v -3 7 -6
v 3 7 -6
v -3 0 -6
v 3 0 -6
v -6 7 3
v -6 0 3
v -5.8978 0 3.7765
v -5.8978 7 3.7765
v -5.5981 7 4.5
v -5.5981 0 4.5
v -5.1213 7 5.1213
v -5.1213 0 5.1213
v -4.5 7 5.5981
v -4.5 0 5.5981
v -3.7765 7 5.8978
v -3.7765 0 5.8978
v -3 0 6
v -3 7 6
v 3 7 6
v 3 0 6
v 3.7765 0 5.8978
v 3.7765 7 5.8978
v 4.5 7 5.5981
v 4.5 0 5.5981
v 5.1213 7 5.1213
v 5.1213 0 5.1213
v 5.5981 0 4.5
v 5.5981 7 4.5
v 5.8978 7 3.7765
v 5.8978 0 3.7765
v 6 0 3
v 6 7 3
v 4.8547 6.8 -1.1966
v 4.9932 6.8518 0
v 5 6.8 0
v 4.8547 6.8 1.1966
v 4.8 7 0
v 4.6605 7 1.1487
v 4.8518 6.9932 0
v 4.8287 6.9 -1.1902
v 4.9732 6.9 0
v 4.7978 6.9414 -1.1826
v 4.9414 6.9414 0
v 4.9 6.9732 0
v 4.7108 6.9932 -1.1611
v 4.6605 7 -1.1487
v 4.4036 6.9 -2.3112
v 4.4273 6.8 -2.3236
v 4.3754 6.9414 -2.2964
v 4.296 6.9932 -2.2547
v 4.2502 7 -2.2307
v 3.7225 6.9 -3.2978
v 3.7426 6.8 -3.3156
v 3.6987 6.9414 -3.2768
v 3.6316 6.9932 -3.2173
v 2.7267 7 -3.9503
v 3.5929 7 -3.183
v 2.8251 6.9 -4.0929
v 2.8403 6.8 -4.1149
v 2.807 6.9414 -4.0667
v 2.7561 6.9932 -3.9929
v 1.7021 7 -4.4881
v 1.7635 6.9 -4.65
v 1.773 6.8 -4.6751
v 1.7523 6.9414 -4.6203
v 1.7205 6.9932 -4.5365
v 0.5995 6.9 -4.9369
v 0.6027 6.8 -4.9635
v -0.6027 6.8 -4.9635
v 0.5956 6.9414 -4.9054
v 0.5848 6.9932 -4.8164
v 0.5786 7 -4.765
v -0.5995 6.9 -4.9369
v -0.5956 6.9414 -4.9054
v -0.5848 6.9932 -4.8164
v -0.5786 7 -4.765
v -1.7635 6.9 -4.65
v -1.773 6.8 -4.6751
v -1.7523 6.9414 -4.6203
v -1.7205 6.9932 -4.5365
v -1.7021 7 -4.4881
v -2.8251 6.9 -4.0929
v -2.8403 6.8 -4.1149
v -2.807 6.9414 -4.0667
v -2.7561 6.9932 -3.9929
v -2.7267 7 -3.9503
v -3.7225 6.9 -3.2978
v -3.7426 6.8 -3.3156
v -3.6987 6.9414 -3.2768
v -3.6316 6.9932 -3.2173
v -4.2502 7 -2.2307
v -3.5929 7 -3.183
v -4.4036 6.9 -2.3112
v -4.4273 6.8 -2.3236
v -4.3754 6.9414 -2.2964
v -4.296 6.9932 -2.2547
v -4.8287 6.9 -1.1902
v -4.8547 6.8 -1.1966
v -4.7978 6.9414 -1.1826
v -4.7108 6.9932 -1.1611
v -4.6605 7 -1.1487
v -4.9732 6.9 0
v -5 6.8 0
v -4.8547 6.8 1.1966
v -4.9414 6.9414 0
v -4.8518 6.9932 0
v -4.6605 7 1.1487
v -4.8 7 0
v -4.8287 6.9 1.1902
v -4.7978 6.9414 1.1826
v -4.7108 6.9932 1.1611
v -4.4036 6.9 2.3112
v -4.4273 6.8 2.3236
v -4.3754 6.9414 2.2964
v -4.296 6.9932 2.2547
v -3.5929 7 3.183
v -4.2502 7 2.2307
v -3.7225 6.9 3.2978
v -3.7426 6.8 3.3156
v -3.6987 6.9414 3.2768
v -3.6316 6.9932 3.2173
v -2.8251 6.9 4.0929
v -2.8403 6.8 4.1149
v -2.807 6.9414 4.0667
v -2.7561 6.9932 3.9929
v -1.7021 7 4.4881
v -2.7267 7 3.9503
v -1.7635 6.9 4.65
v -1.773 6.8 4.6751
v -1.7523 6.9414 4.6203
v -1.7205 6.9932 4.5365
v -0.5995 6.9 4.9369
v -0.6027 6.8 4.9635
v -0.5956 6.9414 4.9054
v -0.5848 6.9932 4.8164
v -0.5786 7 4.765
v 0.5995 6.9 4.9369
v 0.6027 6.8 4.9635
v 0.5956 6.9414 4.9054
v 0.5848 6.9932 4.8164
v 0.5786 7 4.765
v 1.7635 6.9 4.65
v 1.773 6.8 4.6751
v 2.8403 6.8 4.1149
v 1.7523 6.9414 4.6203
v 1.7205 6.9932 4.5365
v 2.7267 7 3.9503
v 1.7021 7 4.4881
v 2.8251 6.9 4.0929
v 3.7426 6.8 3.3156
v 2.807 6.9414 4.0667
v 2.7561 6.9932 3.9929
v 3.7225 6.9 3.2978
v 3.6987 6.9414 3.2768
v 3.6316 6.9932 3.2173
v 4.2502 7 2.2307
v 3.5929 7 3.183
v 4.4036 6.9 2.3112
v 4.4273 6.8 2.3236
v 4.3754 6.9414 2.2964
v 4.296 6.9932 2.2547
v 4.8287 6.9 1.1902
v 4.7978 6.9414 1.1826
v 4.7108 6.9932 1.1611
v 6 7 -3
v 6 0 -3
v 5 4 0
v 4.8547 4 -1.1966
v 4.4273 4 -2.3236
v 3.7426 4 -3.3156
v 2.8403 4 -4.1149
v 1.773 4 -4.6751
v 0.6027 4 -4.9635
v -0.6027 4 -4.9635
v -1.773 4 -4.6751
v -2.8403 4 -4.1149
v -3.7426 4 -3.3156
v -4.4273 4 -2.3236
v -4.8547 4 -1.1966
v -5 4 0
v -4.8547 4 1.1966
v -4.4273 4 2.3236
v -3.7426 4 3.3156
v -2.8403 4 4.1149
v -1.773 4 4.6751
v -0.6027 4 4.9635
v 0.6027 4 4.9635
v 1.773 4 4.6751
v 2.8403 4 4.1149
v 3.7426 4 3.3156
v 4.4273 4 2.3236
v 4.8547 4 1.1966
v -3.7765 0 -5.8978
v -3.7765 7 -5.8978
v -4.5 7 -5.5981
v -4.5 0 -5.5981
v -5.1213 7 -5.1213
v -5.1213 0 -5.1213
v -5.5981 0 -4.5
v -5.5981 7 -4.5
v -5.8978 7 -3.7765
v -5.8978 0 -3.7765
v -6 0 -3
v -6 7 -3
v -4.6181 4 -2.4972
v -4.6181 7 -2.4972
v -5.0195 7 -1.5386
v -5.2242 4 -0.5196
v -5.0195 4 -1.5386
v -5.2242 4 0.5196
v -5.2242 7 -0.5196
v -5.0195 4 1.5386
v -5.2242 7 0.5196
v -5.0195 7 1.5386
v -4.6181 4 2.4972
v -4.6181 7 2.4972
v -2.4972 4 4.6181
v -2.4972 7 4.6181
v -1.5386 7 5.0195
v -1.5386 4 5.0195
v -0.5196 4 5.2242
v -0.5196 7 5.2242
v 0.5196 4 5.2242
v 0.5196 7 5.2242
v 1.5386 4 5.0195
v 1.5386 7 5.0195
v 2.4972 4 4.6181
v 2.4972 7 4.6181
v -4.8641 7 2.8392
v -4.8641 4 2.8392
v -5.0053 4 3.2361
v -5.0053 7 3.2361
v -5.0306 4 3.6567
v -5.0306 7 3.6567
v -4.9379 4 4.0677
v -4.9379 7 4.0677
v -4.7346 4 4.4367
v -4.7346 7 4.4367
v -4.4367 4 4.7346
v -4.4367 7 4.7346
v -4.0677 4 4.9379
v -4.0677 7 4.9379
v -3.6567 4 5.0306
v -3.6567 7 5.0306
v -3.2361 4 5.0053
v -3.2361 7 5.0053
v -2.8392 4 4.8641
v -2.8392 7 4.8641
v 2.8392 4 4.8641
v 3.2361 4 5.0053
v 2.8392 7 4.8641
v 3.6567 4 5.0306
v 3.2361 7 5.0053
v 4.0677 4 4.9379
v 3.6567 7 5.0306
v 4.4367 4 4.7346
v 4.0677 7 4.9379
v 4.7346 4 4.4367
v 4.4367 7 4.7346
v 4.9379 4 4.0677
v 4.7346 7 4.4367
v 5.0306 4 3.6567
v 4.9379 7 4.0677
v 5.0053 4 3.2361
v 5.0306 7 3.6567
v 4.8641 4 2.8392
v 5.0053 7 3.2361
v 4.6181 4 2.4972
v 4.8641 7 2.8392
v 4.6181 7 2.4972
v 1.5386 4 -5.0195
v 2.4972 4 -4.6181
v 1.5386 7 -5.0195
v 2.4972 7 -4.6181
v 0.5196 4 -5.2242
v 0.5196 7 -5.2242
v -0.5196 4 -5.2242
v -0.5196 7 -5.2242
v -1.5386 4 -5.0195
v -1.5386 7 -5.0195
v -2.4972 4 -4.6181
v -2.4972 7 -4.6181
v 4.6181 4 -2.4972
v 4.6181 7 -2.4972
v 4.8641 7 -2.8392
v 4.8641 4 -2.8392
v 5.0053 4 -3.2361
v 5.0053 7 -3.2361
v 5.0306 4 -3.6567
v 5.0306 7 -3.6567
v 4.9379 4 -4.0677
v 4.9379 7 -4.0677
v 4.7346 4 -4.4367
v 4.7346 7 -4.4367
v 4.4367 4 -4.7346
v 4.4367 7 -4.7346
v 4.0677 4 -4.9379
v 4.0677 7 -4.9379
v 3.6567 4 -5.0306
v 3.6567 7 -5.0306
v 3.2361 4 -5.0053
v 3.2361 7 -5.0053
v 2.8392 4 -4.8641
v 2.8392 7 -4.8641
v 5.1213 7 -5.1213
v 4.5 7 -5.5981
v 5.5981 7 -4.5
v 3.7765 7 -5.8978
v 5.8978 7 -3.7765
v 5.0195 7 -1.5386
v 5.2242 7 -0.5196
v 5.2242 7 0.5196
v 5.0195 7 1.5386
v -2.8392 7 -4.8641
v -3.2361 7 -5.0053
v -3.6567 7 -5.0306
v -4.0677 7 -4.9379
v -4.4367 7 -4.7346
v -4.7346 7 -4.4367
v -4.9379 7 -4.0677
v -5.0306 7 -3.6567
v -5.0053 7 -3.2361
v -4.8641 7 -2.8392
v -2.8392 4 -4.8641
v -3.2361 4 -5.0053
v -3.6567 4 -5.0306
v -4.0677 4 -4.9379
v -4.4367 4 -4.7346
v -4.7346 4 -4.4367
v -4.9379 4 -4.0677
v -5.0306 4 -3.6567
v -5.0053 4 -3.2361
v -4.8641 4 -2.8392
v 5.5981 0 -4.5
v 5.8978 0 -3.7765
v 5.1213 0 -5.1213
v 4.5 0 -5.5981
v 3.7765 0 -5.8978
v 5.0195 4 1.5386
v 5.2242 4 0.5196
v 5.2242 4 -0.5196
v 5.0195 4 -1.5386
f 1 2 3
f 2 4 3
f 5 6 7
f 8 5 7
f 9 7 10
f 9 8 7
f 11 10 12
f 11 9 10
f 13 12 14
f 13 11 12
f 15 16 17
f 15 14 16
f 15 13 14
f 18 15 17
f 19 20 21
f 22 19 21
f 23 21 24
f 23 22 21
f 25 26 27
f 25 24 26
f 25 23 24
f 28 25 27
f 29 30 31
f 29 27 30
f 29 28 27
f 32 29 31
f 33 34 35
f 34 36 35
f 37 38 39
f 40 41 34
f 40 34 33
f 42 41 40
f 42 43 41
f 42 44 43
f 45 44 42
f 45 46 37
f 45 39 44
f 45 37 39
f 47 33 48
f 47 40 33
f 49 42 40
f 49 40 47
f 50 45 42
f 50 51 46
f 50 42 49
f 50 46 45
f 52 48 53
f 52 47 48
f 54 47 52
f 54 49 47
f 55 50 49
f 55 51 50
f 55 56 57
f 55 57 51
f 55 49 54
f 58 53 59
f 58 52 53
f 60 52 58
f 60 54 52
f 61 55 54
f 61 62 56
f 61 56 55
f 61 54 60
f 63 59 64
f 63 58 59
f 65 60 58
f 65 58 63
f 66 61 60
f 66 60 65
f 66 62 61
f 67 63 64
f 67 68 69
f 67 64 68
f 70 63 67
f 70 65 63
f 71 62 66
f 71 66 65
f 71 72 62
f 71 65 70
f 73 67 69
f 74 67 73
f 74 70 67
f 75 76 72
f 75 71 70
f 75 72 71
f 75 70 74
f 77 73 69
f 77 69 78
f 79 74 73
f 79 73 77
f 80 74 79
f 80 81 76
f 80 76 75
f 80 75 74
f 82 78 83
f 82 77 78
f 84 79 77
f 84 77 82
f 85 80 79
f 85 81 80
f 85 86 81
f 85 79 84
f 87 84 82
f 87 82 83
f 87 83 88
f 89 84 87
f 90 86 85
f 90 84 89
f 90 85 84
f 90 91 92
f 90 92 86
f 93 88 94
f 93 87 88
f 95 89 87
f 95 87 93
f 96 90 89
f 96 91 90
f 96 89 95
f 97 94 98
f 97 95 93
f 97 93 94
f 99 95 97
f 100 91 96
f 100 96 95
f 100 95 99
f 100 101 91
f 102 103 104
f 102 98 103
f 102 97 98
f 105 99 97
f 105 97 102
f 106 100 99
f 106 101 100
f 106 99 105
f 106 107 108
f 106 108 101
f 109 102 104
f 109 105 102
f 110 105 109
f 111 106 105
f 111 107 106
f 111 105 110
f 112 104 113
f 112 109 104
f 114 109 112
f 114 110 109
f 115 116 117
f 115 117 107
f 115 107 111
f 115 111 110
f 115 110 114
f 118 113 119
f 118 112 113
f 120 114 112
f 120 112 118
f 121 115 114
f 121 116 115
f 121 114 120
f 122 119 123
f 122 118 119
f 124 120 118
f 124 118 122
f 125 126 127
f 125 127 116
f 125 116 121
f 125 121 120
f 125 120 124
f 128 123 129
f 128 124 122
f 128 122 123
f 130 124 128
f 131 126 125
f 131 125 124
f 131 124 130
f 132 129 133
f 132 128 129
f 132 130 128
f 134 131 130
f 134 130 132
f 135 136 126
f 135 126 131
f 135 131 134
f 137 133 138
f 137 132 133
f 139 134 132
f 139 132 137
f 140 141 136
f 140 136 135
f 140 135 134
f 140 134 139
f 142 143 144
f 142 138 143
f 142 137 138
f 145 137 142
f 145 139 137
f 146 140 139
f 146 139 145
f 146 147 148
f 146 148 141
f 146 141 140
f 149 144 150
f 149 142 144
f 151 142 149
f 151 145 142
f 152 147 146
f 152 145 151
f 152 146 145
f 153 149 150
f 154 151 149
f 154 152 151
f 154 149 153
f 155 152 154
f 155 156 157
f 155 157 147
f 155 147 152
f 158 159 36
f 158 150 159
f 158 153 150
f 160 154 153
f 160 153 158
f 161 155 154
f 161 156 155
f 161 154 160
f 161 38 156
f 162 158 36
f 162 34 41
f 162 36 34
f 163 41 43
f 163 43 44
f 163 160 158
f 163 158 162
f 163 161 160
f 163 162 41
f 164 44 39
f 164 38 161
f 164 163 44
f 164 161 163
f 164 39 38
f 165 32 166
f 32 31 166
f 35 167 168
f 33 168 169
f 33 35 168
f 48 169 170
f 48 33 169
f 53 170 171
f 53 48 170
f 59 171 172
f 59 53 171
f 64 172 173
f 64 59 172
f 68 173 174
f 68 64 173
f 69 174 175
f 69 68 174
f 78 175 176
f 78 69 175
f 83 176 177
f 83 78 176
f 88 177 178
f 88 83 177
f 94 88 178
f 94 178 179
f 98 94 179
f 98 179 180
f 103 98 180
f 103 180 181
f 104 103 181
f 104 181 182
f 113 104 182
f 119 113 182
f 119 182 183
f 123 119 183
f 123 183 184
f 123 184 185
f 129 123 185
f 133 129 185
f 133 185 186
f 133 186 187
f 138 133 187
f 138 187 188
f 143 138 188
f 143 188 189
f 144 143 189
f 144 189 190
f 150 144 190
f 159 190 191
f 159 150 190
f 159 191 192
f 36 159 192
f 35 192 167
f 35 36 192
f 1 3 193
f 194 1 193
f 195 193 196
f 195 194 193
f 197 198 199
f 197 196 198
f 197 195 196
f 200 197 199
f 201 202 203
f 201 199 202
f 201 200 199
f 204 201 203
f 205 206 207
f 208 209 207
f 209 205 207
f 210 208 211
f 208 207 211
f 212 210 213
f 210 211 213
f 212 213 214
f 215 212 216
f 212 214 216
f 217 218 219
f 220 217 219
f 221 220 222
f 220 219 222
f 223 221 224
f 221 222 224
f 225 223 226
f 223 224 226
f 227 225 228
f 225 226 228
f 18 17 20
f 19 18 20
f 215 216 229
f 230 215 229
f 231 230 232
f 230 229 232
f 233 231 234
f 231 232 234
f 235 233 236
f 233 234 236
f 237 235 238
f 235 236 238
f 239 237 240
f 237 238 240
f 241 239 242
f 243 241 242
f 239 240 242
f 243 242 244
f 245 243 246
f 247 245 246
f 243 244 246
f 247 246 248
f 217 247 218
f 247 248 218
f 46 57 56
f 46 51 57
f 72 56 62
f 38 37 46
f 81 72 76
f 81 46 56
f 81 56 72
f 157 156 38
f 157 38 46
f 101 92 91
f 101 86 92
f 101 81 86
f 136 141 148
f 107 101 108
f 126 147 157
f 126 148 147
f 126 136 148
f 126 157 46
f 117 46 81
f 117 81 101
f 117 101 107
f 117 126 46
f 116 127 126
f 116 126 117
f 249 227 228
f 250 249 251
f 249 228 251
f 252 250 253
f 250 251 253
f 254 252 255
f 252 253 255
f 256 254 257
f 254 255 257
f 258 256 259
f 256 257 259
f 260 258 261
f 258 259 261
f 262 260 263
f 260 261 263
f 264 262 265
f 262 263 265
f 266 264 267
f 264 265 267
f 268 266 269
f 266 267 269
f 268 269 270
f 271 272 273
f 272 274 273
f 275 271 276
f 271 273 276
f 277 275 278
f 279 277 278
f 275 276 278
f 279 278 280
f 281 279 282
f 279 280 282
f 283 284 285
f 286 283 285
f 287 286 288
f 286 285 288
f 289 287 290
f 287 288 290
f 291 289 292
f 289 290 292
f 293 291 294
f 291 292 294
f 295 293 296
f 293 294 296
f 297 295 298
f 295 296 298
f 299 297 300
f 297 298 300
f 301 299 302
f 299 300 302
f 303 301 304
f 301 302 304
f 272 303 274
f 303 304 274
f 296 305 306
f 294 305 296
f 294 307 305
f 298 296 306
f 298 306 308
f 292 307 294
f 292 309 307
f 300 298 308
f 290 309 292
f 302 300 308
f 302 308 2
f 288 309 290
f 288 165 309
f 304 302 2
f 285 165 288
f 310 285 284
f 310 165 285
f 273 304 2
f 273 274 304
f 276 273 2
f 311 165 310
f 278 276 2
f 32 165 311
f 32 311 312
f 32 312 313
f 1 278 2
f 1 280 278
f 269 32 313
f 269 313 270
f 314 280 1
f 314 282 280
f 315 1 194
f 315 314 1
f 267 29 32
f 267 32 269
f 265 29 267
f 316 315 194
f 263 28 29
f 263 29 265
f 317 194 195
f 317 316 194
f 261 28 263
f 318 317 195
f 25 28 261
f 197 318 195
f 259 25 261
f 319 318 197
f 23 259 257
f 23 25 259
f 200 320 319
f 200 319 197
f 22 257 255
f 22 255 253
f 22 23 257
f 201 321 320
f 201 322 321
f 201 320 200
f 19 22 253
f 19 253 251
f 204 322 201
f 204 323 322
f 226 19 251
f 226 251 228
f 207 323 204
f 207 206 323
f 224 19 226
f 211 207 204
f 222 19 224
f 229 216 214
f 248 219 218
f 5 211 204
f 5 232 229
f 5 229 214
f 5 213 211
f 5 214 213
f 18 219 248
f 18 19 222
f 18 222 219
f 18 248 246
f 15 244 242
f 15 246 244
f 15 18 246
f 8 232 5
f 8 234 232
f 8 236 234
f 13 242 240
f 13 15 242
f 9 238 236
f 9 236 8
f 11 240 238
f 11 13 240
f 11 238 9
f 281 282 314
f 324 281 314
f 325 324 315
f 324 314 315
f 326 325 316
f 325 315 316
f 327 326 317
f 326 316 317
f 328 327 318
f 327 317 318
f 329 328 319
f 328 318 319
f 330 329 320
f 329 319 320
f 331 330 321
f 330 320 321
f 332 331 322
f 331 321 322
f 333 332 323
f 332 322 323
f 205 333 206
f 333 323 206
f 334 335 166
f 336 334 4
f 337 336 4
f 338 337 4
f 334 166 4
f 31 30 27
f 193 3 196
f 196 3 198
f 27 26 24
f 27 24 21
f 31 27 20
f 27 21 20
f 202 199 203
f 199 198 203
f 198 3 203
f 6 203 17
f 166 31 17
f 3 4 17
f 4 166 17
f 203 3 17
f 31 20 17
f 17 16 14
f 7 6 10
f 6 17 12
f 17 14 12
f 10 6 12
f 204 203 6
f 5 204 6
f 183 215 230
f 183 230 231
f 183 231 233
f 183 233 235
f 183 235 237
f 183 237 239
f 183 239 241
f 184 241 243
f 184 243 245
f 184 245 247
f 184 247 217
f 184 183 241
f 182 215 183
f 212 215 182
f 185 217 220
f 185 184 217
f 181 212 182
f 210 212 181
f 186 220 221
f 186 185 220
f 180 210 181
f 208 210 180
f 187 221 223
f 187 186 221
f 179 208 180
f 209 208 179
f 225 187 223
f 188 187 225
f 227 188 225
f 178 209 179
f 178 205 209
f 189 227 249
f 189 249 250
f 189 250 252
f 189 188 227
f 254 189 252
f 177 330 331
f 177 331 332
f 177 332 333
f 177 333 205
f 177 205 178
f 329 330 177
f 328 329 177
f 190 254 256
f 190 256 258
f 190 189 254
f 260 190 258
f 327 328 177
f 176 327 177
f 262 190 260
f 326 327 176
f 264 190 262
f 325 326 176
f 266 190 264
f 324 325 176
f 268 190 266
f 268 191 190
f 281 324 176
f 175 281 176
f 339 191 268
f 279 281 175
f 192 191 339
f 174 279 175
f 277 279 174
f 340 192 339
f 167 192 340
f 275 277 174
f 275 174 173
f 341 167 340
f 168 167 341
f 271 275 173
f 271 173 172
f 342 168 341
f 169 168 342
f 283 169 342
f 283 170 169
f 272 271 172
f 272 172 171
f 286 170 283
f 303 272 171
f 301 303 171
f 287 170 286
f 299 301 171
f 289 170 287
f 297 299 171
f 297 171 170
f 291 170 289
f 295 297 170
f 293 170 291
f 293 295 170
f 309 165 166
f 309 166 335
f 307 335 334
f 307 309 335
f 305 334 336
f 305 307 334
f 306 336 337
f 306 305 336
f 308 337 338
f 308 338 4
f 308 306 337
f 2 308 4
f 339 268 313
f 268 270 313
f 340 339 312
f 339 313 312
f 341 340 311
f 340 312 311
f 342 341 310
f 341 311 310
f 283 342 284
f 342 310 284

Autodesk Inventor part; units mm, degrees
ref_plane "YZ Plane" through (0, 0, 0) normal (1, 0, 0) x (0, 1, 0)
ref_plane "XZ Plane" through (0, 0, 0) normal (0, 1, 0) x (-1, 0, 0)
ref_plane "XY Plane" through (0, 0, 0) normal (0, 0, 1) x (1, 0, 0)
sketch "スケッチ1" plane through (0, 0, 0) normal (0, 1, 0) x (-1, 0, 0)
  line L0 (-6, -6) -> (6, -6)
  line L1 (6, -6) -> (6, 6)
  line L2 (6, 6) -> (-6, 6)
  line L3 (-6, 6) -> (-6, -6)
  line L4 (-6, -6) -> (6, 6) construction
  line L5 (6, -6) -> (-6, 6) construction
  point P0 (0, 0)
  dimension "d0" = 12
extrude "押し出し1" add sketch "スケッチ1" along normal blind 7
fillet "フィレット1" radius 3 4 edges at (6, 3.5, 6) (6, 3.5, -6) (-6, 3.5, 6) (-6, 3.5, -6)
sketch "スケッチ2" plane through (0, 7, 0) normal (0, 1, 0) x (1, 0, 0)
  circle A0 centre (0, 0) radius 5
  circle A1 centre (-3.5355, 3.5355) radius 1.5
  circle A2 centre (3.5355, 3.5355) radius 1.5
  circle A3 centre (3.5355, -3.5355) radius 1.5
  circle A4 centre (-3.5355, -3.5355) radius 1.5
  line L0 (-3.5355, -3.5355) -> (3.5355, 3.5355) construction
  line L1 (-3.5355, 3.5355) -> (3.5355, -3.5355) construction
  line L2 (-8.4, 0) -> (8.4, 0) projected
  circle A5 centre (0, 0) radius 5.25
  point P0 (0, 0)
  point P1 (4.6181, -2.4972)
  point P2 (4.6181, 2.4972)
  point P3 (2.4972, 4.6181)
  point P4 (-2.4972, 4.6181)
  point P5 (-4.6181, 2.4972)
  point P6 (-4.6181, -2.4972)
  point P7 (-2.4972, -4.6181)
  point P8 (2.4972, -4.6181)
  dimension "d4" = 10
  dimension "d5" = 3
  dimension "d6" = 3
  dimension "d7" = 3
  dimension "d8" = 3
  dimension "d9" = 45
  dimension "d10" = 10.5
extrude "押し出し2" cut sketch "スケッチ2" against normal blind 3 contours L2 A5 A3 A0 | A0 A2 A5 L2 | A0 A2 A5 | A3 A5 A0 | L2 A5 A1 A0 | A0 A4 A5 L2 | A0 A1 A5 A2 | A5 A2 | A3 A5 A4 A0 | A3 A5 | A1 A5 A0 | A0 A4 A5 | A1 A5 | A5 A4
fillet "フィレット2" radius 0.2 1 edges at (-5, 7, 0)
properties part number "smd_power_inductor" material "アルミニウム 6061"
